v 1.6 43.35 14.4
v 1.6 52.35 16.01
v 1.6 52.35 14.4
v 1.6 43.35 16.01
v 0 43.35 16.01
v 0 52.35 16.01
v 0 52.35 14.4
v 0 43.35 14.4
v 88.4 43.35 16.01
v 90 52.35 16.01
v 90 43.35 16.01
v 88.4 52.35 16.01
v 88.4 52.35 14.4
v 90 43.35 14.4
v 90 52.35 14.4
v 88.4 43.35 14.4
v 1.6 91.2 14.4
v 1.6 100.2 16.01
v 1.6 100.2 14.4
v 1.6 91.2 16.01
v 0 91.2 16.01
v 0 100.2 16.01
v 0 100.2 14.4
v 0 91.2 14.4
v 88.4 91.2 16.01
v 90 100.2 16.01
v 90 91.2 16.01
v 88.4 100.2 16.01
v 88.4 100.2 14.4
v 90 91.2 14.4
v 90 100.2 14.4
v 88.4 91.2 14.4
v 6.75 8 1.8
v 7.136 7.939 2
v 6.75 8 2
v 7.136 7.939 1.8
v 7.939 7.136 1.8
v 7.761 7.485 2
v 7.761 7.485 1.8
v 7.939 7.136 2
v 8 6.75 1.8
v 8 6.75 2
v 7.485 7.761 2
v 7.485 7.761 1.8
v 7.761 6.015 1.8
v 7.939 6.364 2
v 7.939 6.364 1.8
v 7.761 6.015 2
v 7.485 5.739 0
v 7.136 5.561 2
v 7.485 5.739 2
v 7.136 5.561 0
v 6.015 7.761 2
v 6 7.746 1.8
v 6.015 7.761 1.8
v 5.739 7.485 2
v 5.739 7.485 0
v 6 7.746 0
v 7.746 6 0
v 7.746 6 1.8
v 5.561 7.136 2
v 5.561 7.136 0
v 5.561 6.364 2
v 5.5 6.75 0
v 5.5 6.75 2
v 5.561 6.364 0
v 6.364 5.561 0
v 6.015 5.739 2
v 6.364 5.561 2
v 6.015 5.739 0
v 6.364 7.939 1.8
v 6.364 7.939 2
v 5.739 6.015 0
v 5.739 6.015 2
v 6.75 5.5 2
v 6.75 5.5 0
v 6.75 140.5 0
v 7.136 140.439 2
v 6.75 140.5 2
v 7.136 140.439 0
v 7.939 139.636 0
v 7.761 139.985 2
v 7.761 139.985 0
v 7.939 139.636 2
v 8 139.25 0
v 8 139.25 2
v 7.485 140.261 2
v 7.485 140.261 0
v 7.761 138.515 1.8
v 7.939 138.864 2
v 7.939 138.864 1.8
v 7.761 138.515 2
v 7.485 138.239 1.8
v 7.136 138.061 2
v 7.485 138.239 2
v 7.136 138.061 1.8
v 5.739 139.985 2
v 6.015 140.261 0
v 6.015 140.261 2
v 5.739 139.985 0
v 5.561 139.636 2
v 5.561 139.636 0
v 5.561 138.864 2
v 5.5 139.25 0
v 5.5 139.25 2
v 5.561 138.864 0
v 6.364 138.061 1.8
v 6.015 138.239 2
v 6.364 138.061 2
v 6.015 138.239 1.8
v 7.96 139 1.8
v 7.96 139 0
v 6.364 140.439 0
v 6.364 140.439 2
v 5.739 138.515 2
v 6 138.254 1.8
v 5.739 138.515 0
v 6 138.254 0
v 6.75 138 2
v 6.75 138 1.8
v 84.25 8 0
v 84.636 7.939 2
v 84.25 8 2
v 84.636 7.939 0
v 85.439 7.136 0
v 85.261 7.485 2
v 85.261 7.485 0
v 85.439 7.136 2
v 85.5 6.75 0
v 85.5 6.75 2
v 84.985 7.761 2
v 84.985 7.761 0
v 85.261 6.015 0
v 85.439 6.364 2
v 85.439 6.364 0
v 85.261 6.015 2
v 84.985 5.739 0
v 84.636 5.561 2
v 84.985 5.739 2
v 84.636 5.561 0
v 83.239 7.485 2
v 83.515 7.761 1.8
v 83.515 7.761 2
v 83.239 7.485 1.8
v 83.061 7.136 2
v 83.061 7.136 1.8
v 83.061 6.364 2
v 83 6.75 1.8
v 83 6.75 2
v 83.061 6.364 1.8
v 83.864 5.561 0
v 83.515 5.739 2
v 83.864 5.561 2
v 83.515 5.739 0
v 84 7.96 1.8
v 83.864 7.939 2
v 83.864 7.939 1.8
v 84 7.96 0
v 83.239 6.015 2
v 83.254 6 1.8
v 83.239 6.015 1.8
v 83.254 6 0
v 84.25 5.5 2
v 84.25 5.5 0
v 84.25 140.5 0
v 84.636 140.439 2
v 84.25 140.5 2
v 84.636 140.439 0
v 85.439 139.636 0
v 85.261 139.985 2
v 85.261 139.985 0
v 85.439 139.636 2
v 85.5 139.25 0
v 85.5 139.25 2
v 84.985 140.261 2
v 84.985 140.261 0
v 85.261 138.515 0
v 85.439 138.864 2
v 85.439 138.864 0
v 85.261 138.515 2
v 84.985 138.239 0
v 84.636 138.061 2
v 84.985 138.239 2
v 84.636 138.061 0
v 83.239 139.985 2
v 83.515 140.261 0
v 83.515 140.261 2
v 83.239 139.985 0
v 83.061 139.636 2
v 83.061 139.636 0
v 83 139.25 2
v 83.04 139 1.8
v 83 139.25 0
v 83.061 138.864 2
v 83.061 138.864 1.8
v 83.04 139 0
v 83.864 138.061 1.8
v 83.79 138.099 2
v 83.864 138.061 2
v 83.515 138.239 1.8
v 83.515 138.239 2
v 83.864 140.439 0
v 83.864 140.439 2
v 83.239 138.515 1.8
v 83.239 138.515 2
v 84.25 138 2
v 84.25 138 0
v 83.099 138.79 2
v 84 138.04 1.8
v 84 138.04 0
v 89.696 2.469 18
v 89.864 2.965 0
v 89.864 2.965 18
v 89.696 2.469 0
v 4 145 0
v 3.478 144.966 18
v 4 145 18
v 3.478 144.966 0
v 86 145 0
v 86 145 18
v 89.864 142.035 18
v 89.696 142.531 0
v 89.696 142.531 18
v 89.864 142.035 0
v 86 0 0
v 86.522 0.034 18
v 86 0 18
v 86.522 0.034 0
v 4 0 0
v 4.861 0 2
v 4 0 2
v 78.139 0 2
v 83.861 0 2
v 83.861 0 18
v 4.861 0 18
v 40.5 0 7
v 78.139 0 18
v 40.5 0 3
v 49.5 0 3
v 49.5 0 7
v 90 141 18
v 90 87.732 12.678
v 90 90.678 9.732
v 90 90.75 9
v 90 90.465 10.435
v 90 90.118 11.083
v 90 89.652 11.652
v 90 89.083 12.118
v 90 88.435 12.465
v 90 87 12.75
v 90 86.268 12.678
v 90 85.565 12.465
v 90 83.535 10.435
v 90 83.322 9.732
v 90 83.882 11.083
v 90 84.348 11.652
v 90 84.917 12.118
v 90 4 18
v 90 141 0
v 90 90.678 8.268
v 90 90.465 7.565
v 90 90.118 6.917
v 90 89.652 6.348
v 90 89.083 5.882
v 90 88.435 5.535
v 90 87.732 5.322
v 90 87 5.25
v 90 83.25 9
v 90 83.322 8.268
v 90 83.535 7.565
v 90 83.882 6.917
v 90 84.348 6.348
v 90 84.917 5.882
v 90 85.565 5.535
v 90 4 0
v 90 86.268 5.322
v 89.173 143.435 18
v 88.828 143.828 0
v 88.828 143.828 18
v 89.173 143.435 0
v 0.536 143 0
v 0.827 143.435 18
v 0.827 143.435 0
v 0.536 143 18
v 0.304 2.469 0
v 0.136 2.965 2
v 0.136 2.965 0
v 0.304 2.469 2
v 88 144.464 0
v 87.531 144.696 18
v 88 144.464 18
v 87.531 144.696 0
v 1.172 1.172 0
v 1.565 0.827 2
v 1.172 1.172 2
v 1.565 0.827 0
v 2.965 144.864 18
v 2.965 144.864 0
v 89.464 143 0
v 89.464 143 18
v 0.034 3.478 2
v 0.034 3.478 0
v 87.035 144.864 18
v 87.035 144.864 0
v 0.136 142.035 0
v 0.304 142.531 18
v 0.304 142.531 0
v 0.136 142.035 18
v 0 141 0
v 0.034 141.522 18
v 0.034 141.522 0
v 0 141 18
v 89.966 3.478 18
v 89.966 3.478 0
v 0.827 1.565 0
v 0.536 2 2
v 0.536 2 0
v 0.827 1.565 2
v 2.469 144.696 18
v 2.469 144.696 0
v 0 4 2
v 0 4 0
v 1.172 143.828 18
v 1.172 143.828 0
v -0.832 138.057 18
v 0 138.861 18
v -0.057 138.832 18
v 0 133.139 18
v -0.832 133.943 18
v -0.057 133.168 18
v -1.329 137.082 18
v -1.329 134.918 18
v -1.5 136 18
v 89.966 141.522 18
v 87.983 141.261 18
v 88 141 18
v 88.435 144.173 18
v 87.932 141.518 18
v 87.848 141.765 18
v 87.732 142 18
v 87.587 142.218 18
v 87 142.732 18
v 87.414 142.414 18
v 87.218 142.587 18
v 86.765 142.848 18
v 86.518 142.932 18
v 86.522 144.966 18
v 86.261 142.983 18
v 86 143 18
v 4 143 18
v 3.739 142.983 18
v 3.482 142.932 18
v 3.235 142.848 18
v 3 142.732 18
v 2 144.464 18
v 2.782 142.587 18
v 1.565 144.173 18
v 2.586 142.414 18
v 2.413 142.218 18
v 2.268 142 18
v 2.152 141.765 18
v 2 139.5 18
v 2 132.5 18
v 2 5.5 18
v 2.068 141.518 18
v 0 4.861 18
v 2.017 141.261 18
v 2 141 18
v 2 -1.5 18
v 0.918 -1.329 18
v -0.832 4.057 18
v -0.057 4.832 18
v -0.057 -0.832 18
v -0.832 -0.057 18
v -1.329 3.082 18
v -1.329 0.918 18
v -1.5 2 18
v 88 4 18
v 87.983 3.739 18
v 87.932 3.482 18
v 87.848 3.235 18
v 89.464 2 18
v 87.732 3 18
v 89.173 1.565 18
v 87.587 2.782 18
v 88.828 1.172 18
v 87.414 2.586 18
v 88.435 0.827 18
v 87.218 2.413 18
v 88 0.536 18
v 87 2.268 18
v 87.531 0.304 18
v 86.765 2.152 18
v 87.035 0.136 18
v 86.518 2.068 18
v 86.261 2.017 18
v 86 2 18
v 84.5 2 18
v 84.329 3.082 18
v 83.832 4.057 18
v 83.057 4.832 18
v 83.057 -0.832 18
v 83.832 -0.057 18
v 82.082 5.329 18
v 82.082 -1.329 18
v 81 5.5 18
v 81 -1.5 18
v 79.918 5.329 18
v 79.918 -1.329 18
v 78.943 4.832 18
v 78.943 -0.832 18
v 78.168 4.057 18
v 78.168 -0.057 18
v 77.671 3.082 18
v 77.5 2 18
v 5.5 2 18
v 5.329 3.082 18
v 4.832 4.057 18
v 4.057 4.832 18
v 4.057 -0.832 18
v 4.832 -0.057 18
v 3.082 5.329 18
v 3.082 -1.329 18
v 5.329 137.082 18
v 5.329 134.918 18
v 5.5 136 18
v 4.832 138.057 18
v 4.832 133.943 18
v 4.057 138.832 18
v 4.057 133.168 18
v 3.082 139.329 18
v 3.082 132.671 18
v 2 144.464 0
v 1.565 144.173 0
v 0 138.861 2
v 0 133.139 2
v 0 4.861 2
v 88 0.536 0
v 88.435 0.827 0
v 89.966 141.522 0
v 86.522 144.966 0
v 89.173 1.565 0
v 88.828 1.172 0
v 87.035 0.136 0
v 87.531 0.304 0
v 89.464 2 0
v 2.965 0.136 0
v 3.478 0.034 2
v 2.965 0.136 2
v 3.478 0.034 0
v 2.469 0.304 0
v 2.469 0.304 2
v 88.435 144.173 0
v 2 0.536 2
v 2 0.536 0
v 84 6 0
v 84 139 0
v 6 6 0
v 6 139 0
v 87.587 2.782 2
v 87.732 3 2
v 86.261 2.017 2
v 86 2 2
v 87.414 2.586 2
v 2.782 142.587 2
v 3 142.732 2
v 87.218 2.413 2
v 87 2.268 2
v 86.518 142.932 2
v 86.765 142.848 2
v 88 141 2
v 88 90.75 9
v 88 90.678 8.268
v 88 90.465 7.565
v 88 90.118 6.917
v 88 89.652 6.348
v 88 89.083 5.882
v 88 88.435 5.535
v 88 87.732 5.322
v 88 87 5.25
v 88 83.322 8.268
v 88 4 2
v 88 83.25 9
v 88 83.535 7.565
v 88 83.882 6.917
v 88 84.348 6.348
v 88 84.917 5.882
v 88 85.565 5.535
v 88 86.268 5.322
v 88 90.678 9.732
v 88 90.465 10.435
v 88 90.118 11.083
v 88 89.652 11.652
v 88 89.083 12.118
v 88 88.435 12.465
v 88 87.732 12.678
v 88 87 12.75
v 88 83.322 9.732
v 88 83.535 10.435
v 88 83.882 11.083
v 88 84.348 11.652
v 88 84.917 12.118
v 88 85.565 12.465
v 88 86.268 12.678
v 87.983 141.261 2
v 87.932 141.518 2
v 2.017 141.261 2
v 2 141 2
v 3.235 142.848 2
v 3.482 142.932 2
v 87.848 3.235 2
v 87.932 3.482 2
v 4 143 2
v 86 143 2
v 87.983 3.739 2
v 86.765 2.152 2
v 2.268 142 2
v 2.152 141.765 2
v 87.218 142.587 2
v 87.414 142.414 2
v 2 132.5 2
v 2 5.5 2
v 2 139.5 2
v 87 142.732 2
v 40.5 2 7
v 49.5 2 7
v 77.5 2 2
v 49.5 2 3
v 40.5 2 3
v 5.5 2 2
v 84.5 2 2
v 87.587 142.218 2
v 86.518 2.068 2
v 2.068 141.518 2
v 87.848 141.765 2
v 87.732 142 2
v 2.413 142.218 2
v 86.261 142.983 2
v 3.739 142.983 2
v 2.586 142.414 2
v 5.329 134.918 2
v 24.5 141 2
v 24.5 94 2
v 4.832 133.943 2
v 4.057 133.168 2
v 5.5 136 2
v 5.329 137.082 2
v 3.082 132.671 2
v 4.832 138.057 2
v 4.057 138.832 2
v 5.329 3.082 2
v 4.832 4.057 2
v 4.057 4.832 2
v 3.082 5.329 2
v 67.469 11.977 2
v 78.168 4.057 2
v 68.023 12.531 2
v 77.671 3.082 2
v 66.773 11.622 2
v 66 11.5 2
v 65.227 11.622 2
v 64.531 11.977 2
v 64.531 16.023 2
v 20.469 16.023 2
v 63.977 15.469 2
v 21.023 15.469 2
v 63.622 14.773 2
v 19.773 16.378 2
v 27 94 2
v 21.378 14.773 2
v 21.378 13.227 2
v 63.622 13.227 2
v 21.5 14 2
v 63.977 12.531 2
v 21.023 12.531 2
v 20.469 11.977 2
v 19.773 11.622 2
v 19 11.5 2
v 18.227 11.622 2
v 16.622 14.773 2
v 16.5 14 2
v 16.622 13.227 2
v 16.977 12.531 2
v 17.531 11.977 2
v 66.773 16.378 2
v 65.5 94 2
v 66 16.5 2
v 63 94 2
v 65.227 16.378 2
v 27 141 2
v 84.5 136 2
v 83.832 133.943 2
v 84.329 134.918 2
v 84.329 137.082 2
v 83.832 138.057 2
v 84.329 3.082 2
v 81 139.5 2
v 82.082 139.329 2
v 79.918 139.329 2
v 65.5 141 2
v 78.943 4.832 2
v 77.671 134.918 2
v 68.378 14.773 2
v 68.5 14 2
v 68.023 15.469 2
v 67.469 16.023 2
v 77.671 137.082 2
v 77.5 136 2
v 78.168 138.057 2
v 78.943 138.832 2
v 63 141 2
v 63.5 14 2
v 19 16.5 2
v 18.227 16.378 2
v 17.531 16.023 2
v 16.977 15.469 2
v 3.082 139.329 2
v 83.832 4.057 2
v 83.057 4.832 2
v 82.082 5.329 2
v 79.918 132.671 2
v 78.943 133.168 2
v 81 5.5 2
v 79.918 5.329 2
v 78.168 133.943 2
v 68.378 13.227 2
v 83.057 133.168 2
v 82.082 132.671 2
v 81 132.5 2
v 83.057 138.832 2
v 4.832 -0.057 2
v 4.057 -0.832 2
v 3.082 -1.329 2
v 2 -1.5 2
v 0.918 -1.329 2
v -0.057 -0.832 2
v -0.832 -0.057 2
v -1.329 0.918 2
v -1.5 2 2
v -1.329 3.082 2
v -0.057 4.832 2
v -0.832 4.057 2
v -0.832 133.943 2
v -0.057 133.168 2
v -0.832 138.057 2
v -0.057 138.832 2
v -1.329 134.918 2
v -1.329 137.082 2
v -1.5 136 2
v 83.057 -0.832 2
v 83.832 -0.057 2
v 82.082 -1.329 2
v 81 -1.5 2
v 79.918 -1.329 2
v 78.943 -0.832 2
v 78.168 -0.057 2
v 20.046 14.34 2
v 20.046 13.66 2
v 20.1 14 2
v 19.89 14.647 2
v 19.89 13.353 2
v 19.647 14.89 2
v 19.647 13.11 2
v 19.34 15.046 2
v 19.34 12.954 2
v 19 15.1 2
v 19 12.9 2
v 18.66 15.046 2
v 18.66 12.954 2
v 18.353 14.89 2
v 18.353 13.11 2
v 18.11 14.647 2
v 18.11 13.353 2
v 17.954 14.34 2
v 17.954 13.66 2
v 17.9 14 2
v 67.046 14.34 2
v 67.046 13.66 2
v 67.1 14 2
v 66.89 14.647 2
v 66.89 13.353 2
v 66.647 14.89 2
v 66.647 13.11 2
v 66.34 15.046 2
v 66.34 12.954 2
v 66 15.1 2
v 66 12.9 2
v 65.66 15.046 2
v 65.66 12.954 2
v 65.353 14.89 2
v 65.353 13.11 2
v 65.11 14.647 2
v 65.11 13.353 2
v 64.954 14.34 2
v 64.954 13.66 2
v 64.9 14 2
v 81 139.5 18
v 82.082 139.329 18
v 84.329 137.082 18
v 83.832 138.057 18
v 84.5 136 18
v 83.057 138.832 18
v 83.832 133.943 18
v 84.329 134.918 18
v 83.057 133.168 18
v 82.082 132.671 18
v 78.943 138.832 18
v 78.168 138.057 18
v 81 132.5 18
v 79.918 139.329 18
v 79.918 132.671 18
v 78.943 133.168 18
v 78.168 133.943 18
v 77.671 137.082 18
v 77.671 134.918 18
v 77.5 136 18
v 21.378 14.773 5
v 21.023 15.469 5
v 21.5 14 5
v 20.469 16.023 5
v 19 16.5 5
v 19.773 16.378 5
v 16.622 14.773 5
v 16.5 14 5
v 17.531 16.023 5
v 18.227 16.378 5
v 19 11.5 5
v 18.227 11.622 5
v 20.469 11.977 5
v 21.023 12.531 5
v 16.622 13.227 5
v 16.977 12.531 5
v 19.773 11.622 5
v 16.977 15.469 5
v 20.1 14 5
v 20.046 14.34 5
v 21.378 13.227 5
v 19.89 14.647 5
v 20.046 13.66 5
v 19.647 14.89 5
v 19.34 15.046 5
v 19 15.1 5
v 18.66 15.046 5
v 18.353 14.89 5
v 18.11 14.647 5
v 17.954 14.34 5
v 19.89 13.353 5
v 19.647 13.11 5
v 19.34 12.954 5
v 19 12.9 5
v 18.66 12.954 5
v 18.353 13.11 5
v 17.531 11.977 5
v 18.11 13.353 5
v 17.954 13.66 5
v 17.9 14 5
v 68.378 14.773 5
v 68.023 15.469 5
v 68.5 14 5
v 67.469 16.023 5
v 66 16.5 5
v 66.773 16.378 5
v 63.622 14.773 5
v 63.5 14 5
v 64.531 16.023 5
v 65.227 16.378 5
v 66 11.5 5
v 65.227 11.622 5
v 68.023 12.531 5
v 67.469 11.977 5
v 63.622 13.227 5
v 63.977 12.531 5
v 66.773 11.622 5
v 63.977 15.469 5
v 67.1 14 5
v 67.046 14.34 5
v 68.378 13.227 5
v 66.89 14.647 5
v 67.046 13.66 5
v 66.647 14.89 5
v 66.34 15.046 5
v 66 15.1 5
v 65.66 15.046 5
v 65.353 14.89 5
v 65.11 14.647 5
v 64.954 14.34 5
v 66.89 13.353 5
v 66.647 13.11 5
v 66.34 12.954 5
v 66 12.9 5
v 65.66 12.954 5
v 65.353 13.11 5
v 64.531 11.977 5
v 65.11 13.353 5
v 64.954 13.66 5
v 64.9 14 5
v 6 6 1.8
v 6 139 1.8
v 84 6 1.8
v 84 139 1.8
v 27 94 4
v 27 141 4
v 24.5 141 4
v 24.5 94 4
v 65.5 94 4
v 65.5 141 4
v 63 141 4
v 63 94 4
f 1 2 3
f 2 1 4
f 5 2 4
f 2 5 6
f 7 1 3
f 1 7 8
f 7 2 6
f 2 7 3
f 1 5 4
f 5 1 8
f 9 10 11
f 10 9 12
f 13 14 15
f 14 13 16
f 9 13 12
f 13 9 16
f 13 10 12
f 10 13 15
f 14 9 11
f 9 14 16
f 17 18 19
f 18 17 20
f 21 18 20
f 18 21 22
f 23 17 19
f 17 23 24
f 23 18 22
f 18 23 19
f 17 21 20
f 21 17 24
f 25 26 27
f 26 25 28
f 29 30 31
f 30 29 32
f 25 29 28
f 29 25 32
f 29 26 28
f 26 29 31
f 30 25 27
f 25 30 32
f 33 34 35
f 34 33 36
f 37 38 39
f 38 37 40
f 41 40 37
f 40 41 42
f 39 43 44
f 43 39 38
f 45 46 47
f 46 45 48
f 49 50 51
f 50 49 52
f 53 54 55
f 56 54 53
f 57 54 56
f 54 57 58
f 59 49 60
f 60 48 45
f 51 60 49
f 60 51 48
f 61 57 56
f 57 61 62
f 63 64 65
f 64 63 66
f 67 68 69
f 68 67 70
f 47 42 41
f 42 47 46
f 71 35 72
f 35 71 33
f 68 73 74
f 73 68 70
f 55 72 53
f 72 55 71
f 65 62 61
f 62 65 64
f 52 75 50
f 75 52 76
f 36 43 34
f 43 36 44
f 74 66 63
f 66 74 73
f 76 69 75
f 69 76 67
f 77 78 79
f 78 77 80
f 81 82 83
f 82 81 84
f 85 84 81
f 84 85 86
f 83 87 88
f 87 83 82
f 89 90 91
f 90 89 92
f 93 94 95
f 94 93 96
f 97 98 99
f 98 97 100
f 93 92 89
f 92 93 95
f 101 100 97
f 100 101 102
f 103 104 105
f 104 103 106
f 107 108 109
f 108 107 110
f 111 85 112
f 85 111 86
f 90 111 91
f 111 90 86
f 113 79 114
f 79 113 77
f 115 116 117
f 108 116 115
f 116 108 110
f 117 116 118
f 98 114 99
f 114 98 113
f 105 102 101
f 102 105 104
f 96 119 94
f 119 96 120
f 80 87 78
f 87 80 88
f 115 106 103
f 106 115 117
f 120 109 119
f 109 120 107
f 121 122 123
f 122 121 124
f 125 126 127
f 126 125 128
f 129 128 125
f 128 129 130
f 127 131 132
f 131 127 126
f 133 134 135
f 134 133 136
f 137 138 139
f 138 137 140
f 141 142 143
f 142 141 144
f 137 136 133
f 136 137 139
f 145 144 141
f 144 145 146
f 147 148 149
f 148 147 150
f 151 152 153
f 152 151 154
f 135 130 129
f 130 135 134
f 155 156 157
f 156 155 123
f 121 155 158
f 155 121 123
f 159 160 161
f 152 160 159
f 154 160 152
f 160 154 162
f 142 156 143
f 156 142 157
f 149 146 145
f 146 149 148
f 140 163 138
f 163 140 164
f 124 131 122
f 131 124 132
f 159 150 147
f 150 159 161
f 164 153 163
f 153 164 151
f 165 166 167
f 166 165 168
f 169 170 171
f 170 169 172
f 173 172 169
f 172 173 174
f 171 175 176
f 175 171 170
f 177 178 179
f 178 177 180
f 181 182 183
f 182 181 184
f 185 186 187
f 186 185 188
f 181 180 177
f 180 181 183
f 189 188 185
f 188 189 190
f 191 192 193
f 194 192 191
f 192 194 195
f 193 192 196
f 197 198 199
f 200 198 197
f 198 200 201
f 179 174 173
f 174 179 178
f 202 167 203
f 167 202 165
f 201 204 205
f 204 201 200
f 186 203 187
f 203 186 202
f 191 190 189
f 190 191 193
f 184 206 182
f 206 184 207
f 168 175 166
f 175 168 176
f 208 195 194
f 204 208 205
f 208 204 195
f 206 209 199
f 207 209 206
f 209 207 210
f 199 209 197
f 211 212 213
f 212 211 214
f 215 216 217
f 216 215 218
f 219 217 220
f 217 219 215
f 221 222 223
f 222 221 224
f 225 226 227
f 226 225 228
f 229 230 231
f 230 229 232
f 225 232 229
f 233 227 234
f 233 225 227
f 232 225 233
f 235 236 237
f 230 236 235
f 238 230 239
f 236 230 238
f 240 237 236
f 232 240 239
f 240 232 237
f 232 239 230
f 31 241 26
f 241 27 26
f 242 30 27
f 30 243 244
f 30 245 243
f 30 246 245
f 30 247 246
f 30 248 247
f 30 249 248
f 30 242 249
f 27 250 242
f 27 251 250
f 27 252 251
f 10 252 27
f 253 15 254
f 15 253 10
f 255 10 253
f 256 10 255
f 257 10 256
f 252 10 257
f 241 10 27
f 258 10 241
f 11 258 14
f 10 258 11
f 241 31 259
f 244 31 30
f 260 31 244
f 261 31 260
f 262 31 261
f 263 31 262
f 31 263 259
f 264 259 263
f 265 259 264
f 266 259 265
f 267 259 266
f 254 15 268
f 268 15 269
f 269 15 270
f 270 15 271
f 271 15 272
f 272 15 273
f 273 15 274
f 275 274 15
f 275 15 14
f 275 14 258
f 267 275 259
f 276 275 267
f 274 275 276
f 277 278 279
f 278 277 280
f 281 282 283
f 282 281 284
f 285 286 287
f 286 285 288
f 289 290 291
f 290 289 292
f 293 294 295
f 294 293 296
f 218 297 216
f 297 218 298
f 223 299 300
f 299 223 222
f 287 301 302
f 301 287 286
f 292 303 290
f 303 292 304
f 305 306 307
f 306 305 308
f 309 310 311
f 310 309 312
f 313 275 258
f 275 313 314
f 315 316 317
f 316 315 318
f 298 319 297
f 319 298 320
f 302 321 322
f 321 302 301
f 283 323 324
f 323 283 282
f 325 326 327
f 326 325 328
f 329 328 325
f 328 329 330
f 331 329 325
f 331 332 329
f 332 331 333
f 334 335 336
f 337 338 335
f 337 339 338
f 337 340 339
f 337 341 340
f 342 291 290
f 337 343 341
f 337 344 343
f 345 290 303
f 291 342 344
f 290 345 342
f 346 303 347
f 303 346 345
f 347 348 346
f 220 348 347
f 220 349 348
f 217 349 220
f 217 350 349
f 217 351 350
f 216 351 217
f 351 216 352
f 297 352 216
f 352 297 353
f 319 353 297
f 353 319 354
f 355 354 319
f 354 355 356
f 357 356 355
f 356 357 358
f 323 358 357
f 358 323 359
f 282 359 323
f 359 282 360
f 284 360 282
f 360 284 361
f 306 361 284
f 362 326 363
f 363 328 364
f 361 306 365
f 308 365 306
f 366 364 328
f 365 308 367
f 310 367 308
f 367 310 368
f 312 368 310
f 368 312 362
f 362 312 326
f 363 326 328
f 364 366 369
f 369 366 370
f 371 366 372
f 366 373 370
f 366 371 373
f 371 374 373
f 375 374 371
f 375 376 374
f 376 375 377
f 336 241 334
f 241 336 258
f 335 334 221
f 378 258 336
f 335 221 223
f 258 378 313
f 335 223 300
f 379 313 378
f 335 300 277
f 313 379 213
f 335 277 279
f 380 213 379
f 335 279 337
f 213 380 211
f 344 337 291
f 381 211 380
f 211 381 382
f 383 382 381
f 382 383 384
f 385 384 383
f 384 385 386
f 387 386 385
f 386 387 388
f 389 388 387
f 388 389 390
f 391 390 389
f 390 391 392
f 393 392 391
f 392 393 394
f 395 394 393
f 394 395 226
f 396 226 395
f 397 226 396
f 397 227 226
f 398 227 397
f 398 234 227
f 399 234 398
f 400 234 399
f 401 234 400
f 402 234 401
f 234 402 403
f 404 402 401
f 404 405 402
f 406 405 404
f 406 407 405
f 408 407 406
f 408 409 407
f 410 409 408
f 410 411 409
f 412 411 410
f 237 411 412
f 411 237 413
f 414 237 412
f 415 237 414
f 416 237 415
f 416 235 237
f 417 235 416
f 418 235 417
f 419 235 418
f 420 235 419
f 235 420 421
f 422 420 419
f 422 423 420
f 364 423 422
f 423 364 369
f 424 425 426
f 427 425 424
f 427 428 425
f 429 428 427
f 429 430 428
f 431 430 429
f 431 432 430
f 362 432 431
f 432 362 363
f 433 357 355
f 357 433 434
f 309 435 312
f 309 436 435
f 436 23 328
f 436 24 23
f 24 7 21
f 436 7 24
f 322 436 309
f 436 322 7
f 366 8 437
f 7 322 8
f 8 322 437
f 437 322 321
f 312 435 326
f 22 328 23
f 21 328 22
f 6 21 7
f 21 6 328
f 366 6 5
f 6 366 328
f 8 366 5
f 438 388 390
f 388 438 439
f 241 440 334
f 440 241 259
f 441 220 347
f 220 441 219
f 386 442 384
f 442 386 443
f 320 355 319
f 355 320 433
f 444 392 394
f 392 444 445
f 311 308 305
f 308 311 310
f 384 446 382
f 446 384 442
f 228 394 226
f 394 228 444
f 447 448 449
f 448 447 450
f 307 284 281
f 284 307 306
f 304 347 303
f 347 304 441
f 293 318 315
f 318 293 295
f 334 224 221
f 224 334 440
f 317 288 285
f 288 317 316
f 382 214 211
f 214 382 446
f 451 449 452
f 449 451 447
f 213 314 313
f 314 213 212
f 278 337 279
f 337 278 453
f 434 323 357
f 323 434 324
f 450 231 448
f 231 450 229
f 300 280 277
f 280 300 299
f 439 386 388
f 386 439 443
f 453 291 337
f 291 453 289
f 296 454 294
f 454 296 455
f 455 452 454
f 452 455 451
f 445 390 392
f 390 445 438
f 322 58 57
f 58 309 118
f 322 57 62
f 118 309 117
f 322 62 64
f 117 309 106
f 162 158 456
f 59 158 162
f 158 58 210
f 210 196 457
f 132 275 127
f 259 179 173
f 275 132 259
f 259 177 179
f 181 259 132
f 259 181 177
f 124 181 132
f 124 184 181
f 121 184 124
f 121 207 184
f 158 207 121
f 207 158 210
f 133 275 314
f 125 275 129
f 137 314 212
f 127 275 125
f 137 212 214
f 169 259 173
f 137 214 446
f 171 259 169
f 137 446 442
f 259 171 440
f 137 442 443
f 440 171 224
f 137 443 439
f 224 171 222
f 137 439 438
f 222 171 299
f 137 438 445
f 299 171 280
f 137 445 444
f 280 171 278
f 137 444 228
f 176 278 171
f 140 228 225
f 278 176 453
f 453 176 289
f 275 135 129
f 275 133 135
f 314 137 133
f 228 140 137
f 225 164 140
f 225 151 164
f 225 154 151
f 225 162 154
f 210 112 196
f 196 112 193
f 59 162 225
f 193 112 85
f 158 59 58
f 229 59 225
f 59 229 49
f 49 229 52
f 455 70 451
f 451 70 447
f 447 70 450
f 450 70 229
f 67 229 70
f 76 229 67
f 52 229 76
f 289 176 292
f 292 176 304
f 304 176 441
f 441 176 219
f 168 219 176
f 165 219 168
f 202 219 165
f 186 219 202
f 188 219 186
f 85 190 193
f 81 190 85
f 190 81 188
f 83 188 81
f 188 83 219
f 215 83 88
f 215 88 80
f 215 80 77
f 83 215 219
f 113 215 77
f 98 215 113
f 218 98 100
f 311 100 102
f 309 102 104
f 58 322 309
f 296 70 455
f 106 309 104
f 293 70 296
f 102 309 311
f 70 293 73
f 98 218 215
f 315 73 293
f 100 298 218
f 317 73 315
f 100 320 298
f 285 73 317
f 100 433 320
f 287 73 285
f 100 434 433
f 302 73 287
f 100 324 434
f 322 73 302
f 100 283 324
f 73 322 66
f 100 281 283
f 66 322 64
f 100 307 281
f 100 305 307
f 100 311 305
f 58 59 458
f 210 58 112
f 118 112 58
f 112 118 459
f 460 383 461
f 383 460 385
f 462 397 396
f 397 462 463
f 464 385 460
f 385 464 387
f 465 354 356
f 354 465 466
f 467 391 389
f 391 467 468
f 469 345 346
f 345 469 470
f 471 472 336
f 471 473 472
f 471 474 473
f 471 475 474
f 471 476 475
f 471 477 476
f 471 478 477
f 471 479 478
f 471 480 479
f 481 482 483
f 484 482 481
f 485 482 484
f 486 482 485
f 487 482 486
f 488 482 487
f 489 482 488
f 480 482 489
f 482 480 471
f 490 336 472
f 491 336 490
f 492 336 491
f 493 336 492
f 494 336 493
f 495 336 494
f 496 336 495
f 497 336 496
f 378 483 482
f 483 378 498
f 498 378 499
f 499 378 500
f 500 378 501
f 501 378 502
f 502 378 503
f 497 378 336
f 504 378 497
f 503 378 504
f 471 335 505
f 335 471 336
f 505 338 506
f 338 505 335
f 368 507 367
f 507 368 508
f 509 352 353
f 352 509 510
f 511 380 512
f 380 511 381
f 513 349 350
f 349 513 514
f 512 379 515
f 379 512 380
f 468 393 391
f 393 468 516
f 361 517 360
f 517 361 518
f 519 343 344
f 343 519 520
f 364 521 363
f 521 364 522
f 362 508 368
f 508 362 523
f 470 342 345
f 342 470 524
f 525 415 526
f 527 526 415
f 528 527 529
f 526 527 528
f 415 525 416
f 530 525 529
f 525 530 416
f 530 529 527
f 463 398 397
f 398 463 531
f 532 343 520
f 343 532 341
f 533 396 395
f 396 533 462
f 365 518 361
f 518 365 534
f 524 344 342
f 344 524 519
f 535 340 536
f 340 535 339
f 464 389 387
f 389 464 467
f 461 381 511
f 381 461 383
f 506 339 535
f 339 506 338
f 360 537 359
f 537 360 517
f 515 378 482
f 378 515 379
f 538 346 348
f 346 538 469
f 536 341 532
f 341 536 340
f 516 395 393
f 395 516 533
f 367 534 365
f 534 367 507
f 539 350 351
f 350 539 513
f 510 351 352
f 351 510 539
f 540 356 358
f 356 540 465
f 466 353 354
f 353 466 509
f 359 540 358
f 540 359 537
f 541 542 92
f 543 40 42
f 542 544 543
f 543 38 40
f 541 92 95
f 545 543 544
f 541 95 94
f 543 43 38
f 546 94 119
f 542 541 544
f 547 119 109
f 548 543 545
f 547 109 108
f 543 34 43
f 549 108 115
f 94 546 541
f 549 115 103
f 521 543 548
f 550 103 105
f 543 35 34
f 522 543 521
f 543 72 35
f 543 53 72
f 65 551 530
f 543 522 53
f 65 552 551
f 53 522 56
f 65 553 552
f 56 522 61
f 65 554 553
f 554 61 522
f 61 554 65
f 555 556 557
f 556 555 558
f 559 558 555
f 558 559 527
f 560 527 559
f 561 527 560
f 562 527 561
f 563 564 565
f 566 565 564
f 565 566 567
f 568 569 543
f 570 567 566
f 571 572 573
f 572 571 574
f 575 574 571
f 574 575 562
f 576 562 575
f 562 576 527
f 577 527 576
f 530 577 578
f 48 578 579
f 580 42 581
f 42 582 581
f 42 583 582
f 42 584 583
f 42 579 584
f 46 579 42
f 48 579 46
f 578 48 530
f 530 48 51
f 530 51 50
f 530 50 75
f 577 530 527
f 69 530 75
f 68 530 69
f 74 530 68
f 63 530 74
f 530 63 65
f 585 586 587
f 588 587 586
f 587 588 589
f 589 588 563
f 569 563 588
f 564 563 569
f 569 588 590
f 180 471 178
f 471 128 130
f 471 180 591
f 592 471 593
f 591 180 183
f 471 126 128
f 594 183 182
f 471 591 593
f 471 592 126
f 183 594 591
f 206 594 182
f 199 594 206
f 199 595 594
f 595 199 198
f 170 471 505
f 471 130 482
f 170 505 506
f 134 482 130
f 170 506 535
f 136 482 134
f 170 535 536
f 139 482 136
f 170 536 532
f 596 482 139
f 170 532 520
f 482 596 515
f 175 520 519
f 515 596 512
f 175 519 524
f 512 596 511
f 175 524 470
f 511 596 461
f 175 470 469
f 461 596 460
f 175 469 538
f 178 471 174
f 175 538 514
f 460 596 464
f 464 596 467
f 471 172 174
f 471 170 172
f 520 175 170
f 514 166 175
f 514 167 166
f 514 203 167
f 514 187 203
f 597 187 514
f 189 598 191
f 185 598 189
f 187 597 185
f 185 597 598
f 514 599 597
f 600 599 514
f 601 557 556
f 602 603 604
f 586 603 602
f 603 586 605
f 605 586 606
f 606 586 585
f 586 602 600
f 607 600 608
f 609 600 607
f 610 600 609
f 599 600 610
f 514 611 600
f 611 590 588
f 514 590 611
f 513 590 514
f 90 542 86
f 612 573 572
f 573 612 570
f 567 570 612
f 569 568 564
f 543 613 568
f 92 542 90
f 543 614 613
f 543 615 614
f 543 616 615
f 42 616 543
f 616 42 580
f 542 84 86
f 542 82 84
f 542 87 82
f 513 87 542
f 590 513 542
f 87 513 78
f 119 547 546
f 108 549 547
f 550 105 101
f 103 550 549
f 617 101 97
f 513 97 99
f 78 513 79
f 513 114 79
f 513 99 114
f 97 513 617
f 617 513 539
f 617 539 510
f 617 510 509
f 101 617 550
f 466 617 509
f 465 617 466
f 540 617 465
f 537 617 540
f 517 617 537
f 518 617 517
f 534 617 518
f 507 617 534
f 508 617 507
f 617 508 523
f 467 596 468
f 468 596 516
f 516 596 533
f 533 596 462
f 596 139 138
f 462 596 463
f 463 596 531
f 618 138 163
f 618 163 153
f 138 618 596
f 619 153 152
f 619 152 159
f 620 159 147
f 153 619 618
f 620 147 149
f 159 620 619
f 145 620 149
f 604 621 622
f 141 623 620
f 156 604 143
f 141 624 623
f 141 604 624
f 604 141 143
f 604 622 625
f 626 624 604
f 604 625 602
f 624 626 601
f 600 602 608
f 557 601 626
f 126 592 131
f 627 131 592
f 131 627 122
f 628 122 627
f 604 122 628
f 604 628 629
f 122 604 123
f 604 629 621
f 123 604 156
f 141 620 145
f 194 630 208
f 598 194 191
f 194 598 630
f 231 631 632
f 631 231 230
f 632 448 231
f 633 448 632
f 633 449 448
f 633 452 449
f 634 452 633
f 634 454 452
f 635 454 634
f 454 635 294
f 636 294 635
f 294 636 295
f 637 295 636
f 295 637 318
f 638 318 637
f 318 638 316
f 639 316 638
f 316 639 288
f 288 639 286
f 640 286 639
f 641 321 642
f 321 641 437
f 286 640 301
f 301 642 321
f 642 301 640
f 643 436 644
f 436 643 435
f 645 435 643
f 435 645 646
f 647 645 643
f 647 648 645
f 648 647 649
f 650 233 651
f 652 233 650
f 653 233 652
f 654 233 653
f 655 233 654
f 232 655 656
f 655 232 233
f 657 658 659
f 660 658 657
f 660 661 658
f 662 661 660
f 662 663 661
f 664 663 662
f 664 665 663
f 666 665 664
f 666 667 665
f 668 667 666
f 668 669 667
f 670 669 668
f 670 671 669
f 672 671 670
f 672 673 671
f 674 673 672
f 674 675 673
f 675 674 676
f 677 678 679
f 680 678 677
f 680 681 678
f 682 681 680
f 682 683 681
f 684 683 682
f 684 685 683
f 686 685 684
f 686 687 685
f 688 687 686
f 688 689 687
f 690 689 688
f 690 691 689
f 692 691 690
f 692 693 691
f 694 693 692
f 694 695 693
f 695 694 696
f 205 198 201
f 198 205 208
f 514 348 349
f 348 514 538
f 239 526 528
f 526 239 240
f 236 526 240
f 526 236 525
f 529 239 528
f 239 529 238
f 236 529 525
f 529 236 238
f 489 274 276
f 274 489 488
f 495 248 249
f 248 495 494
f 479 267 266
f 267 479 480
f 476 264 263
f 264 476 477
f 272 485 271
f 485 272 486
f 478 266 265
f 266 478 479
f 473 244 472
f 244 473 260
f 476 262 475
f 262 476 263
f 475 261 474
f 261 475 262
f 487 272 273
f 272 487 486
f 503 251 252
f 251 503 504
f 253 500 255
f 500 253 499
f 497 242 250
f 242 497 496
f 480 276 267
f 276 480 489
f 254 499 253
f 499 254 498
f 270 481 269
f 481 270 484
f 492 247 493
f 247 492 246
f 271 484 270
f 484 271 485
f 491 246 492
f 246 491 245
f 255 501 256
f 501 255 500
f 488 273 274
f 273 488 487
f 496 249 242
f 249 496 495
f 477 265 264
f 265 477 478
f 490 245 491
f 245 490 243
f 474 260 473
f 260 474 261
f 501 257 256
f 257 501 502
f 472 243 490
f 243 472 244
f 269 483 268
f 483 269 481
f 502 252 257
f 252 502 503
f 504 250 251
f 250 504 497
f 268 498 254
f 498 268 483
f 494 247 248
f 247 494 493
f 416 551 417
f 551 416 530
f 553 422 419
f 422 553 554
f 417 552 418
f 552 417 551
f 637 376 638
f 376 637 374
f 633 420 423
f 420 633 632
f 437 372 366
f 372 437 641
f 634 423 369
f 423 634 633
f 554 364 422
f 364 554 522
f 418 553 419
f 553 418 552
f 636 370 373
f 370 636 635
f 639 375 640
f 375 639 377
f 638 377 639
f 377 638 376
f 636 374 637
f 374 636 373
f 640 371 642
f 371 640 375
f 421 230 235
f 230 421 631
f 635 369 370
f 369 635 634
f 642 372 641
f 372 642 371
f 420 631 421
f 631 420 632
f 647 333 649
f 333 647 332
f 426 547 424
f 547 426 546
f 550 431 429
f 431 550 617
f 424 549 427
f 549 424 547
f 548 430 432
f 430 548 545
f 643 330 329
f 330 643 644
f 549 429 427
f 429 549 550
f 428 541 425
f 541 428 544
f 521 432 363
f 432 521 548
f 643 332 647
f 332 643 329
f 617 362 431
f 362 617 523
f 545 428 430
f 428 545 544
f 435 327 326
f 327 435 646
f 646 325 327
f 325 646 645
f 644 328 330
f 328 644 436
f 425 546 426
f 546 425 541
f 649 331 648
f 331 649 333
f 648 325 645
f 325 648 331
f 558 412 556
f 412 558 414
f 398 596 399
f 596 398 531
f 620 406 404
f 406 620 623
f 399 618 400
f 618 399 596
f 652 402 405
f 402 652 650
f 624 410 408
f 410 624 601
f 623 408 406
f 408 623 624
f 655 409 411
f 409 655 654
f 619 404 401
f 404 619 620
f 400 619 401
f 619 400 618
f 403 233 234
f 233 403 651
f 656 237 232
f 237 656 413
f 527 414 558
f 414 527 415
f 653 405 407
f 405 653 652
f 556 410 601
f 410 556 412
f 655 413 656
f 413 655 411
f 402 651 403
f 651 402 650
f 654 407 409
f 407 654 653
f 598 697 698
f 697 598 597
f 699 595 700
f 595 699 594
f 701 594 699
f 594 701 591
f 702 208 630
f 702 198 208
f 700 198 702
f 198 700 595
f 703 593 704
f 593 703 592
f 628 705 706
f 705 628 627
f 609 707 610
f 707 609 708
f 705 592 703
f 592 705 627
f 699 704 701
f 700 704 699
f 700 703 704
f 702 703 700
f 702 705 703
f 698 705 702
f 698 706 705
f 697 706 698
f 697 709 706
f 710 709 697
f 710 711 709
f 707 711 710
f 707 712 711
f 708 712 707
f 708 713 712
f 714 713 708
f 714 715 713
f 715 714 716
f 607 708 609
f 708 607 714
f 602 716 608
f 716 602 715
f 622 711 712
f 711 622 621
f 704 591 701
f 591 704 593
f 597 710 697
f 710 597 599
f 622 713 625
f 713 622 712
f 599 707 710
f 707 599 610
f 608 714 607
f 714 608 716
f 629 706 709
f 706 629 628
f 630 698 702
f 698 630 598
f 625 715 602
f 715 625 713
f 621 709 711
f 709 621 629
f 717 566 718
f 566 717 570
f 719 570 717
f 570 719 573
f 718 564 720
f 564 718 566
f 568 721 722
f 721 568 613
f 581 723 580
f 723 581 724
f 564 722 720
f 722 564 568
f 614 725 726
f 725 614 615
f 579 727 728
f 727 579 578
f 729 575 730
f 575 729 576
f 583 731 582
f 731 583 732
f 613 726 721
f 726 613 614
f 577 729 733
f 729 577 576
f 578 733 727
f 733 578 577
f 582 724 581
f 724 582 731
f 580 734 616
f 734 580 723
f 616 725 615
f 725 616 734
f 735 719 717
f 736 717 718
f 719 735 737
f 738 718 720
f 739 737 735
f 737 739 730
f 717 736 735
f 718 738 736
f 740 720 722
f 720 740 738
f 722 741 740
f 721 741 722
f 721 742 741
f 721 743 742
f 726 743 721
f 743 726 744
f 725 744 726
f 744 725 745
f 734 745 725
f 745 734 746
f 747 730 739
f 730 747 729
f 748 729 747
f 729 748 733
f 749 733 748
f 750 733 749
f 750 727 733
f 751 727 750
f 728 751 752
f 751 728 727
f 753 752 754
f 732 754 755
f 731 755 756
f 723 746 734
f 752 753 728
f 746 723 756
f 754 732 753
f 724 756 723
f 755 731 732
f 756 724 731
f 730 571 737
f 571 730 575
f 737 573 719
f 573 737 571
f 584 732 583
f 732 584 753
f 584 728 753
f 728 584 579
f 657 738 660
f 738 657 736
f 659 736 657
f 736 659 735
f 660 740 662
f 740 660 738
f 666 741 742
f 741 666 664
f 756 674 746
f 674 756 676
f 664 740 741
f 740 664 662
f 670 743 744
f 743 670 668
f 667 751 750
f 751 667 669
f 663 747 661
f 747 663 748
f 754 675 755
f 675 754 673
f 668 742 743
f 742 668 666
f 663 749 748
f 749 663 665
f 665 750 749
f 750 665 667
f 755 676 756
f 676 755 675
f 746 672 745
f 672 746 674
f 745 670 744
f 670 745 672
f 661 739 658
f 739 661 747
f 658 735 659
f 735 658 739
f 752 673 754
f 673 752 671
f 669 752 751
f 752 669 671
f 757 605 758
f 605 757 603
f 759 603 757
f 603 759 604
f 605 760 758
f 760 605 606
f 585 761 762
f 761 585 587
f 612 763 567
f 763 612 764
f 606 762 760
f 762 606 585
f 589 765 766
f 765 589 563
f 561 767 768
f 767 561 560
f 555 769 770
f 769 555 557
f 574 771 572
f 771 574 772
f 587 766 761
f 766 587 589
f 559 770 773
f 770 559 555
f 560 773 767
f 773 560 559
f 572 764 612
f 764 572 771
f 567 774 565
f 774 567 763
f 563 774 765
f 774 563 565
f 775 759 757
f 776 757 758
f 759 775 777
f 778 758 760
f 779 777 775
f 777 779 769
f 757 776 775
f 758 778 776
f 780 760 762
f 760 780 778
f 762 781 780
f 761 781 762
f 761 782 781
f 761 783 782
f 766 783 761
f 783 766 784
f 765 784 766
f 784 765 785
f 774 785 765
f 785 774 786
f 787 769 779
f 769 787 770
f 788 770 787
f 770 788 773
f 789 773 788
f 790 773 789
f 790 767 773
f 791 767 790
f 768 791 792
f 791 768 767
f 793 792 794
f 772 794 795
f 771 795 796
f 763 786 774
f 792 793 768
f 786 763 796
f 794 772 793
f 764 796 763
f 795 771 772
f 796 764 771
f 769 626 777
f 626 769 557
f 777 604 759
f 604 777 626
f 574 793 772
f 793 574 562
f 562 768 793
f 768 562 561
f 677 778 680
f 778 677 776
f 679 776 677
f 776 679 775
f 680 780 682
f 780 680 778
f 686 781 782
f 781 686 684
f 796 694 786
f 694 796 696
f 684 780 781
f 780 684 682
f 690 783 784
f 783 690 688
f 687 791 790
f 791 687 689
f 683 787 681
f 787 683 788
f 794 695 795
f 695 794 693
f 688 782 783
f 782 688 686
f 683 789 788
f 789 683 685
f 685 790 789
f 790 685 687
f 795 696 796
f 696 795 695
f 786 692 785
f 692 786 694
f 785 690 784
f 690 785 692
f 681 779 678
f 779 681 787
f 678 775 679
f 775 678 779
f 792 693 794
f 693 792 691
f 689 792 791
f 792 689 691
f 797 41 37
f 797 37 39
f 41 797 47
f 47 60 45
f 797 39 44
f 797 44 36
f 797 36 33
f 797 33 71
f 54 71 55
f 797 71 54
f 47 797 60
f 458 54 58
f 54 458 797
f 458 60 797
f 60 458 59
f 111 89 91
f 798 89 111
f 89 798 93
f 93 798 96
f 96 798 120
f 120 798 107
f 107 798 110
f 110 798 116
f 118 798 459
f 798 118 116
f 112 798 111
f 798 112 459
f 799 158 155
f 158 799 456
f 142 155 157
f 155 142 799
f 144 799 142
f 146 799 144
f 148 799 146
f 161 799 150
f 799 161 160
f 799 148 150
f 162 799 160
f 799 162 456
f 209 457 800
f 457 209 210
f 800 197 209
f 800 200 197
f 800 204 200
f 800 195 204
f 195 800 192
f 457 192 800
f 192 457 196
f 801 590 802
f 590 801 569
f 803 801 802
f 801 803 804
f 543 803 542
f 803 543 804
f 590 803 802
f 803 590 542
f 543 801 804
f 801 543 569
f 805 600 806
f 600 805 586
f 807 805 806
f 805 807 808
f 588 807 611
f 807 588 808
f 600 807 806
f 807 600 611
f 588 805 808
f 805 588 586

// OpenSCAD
// =============================================================
//  Streamdeck-v1  –  Base Shell  (Minimalist Redesign)
//  Print with the open face up (no supports needed inside).
//  All dimensions in millimetres.
// =============================================================

// ── Outer shell dimensions ────────────────────────────────────
shell_w        = 90;
shell_h        = 145;
shell_d        = 18;      // reduced depth for a slimmer profile
wall           = 2.0;     // shell wall thickness
corner_r       = 4.0;     // outer corner radius (rounded minimalist look)

// ── Faceplate snap-tab slots ──────────────────────────────────
tab_slot_w     = 9;       // slightly wider than the tab
tab_slot_h     = 1.6;     // slightly taller than the tab protrusion
tab_slot_thick = 1.6;

// ── Raspberry Pi Pico standoffs ───────────────────────────────
//   Pico board: 51 × 21 mm, mounting holes ~4.8 mm from each end,
//   centred on the 21 mm axis.  Hole dia = 2.1 mm (M2 clearance).
pico_w          = 51;
pico_h          = 21;
pico_hole_d     = 2.2;    // M2 clearance
pico_standoff_d = 5;      // standoff outer diameter
pico_standoff_h = 3.0;    // height above floor (keeps PCB clear of wires)
// Pico centred horizontally, near the bottom of the shell
pico_x0         = (shell_w - pico_w) / 2;
pico_y0         = wall + 4;
// Mounting holes: 2 mm from each short edge, centred on long axis
pico_hole_offsets = [
    [2,          pico_h / 2],
    [pico_w - 2, pico_h / 2]
];

// ── TFT display ledge ─────────────────────────────────────────
//   Two thin rails near the top hold the TFT PCB (36 × 47 mm).
tft_pcb_w      = 36;
tft_pcb_h      = 47;
tft_shelf_h    = 2;       // shelf thickness
tft_shelf_d    = 2.5;     // how far the shelf protrudes inward
tft_x0         = (shell_w - tft_pcb_w) / 2;
tft_y0         = shell_h - wall - tft_pcb_h - tft_shelf_h;

// ── Micro-USB cutout (bottom short side, y = 0 face) ──────────
usb_w          = 9;       // plug width + tolerance
usb_h          = 4;       // plug height + tolerance
usb_x          = (shell_w - usb_w) / 2;
usb_z          = wall + 1;

// ── Rotary encoder / potentiometer (right side wall) ──────────
//   EC11-style encoder: 7.5 mm bushing hole; body sits inside.
//   Positioned 60 % up the device length, mid-depth – naturally
//   reachable while pressing buttons.
pot_hole_d     = 7.5;
pot_y          = shell_h * 0.6;   // 60 % along the length
pot_z          = shell_d / 2;     // vertically centred on the wall

// ── Corner screw bosses (match faceplate M3 holes) ────────────
boss_d         = 7;
boss_h         = shell_d - wall;  // nearly full depth
boss_hole_d    = 2.5;             // M3 self-tap pilot hole
screw_margin   = 4.5;             // increased clearance for rounded corners

eps = 0.01;

// ── Helper: rounded-corner box via hull of four corner cylinders
module rounded_box(w, h, d, r) {
    hull()
        for (x = [r, w - r])
            for (y = [r, h - r])
                translate([x, y, 0])
                    cylinder(r=r, h=d, $fn=48);
}

// =============================================================
module base_shell() {
    difference() {
        // ── Outer rounded solid ───────────────────────────────
        rounded_box(shell_w, shell_h, shell_d, corner_r);

        // ── Hollow interior (open top) ────────────────────────
        translate([wall, wall, wall])
            rounded_box(
                shell_w - 2*wall,
                shell_h - 2*wall,
                shell_d,                    // cut all the way to open top
                max(corner_r - wall, 0.5)   // inner corner radius
            );

        // ── Micro-USB cutout on bottom face (y = 0 side) ──────
        translate([usb_x, -eps, usb_z])
            cube([usb_w, wall + 2*eps, usb_h]);

        // ── Rotary encoder hole on right side wall ────────────
        translate([shell_w - wall - eps, pot_y, pot_z])
            rotate([0, 90, 0])
                cylinder(d=pot_hole_d, h=wall + 2*eps, $fn=32);

        // ── Faceplate snap-tab slots (inside top rim) ─────────
        for (ty = [shell_h * 0.33, shell_h * 0.66]) {
            // left slot
            translate([-eps, ty - tab_slot_w/2,
                       shell_d - tab_slot_h - wall])
                cube([tab_slot_thick + eps, tab_slot_w,
                      tab_slot_h + eps]);
            // right slot
            translate([shell_w - tab_slot_thick, ty - tab_slot_w/2,
                       shell_d - tab_slot_h - wall])
                cube([tab_slot_thick + eps, tab_slot_w,
                      tab_slot_h + eps]);
        }

        // ── M3 screw holes through corner bosses ──────────────
        for (cx = [screw_margin, shell_w - screw_margin - boss_d/2])
            for (cy = [screw_margin, shell_h - screw_margin - boss_d/2])
                translate([cx + boss_d/2 - boss_hole_d/2,
                           cy + boss_d/2 - boss_hole_d/2,
                           -eps])
                    cylinder(d=boss_hole_d, h=boss_h + 2*eps, $fn=20);
    }

    // ── Corner screw bosses (inside the shell) ────────────────
    for (cx = [wall, shell_w - wall - boss_d])
        for (cy = [wall, shell_h - wall - boss_d])
            translate([cx, cy, wall])
                cylinder(d=boss_d, h=boss_h, $fn=20);

    // ── Pico standoffs ────────────────────────────────────────
    for (ho = pico_hole_offsets)
        translate([pico_x0 + ho[0] - pico_standoff_d/2,
                   pico_y0 + ho[1] - pico_standoff_d/2,
                   wall]) {
            difference() {
                cylinder(d=pico_standoff_d, h=pico_standoff_h, $fn=20);
                translate([0, 0, -eps])
                    cylinder(d=pico_hole_d, h=pico_standoff_h + 2*eps,
                             $fn=20);
            }
        }

    // ── TFT display shelf (left and right rails) ──────────────
    translate([tft_x0 - tft_shelf_d, tft_y0, wall])
        cube([tft_shelf_d, tft_pcb_h, tft_shelf_h]);
    translate([tft_x0 + tft_pcb_w, tft_y0, wall])
        cube([tft_shelf_d, tft_pcb_h, tft_shelf_h]);

    // ── Rubber-foot bumps (4 × pads on outer bottom face) ─────
    foot_size   = 8;
    foot_h      = 1.8;
    foot_margin = 6;
    for (fx = [foot_margin, shell_w - foot_margin - foot_size])
        for (fy = [foot_margin, shell_h - foot_margin - foot_size])
            translate([fx, fy, 0])
                cube([foot_size, foot_size, foot_h]);
}

base_shell();
